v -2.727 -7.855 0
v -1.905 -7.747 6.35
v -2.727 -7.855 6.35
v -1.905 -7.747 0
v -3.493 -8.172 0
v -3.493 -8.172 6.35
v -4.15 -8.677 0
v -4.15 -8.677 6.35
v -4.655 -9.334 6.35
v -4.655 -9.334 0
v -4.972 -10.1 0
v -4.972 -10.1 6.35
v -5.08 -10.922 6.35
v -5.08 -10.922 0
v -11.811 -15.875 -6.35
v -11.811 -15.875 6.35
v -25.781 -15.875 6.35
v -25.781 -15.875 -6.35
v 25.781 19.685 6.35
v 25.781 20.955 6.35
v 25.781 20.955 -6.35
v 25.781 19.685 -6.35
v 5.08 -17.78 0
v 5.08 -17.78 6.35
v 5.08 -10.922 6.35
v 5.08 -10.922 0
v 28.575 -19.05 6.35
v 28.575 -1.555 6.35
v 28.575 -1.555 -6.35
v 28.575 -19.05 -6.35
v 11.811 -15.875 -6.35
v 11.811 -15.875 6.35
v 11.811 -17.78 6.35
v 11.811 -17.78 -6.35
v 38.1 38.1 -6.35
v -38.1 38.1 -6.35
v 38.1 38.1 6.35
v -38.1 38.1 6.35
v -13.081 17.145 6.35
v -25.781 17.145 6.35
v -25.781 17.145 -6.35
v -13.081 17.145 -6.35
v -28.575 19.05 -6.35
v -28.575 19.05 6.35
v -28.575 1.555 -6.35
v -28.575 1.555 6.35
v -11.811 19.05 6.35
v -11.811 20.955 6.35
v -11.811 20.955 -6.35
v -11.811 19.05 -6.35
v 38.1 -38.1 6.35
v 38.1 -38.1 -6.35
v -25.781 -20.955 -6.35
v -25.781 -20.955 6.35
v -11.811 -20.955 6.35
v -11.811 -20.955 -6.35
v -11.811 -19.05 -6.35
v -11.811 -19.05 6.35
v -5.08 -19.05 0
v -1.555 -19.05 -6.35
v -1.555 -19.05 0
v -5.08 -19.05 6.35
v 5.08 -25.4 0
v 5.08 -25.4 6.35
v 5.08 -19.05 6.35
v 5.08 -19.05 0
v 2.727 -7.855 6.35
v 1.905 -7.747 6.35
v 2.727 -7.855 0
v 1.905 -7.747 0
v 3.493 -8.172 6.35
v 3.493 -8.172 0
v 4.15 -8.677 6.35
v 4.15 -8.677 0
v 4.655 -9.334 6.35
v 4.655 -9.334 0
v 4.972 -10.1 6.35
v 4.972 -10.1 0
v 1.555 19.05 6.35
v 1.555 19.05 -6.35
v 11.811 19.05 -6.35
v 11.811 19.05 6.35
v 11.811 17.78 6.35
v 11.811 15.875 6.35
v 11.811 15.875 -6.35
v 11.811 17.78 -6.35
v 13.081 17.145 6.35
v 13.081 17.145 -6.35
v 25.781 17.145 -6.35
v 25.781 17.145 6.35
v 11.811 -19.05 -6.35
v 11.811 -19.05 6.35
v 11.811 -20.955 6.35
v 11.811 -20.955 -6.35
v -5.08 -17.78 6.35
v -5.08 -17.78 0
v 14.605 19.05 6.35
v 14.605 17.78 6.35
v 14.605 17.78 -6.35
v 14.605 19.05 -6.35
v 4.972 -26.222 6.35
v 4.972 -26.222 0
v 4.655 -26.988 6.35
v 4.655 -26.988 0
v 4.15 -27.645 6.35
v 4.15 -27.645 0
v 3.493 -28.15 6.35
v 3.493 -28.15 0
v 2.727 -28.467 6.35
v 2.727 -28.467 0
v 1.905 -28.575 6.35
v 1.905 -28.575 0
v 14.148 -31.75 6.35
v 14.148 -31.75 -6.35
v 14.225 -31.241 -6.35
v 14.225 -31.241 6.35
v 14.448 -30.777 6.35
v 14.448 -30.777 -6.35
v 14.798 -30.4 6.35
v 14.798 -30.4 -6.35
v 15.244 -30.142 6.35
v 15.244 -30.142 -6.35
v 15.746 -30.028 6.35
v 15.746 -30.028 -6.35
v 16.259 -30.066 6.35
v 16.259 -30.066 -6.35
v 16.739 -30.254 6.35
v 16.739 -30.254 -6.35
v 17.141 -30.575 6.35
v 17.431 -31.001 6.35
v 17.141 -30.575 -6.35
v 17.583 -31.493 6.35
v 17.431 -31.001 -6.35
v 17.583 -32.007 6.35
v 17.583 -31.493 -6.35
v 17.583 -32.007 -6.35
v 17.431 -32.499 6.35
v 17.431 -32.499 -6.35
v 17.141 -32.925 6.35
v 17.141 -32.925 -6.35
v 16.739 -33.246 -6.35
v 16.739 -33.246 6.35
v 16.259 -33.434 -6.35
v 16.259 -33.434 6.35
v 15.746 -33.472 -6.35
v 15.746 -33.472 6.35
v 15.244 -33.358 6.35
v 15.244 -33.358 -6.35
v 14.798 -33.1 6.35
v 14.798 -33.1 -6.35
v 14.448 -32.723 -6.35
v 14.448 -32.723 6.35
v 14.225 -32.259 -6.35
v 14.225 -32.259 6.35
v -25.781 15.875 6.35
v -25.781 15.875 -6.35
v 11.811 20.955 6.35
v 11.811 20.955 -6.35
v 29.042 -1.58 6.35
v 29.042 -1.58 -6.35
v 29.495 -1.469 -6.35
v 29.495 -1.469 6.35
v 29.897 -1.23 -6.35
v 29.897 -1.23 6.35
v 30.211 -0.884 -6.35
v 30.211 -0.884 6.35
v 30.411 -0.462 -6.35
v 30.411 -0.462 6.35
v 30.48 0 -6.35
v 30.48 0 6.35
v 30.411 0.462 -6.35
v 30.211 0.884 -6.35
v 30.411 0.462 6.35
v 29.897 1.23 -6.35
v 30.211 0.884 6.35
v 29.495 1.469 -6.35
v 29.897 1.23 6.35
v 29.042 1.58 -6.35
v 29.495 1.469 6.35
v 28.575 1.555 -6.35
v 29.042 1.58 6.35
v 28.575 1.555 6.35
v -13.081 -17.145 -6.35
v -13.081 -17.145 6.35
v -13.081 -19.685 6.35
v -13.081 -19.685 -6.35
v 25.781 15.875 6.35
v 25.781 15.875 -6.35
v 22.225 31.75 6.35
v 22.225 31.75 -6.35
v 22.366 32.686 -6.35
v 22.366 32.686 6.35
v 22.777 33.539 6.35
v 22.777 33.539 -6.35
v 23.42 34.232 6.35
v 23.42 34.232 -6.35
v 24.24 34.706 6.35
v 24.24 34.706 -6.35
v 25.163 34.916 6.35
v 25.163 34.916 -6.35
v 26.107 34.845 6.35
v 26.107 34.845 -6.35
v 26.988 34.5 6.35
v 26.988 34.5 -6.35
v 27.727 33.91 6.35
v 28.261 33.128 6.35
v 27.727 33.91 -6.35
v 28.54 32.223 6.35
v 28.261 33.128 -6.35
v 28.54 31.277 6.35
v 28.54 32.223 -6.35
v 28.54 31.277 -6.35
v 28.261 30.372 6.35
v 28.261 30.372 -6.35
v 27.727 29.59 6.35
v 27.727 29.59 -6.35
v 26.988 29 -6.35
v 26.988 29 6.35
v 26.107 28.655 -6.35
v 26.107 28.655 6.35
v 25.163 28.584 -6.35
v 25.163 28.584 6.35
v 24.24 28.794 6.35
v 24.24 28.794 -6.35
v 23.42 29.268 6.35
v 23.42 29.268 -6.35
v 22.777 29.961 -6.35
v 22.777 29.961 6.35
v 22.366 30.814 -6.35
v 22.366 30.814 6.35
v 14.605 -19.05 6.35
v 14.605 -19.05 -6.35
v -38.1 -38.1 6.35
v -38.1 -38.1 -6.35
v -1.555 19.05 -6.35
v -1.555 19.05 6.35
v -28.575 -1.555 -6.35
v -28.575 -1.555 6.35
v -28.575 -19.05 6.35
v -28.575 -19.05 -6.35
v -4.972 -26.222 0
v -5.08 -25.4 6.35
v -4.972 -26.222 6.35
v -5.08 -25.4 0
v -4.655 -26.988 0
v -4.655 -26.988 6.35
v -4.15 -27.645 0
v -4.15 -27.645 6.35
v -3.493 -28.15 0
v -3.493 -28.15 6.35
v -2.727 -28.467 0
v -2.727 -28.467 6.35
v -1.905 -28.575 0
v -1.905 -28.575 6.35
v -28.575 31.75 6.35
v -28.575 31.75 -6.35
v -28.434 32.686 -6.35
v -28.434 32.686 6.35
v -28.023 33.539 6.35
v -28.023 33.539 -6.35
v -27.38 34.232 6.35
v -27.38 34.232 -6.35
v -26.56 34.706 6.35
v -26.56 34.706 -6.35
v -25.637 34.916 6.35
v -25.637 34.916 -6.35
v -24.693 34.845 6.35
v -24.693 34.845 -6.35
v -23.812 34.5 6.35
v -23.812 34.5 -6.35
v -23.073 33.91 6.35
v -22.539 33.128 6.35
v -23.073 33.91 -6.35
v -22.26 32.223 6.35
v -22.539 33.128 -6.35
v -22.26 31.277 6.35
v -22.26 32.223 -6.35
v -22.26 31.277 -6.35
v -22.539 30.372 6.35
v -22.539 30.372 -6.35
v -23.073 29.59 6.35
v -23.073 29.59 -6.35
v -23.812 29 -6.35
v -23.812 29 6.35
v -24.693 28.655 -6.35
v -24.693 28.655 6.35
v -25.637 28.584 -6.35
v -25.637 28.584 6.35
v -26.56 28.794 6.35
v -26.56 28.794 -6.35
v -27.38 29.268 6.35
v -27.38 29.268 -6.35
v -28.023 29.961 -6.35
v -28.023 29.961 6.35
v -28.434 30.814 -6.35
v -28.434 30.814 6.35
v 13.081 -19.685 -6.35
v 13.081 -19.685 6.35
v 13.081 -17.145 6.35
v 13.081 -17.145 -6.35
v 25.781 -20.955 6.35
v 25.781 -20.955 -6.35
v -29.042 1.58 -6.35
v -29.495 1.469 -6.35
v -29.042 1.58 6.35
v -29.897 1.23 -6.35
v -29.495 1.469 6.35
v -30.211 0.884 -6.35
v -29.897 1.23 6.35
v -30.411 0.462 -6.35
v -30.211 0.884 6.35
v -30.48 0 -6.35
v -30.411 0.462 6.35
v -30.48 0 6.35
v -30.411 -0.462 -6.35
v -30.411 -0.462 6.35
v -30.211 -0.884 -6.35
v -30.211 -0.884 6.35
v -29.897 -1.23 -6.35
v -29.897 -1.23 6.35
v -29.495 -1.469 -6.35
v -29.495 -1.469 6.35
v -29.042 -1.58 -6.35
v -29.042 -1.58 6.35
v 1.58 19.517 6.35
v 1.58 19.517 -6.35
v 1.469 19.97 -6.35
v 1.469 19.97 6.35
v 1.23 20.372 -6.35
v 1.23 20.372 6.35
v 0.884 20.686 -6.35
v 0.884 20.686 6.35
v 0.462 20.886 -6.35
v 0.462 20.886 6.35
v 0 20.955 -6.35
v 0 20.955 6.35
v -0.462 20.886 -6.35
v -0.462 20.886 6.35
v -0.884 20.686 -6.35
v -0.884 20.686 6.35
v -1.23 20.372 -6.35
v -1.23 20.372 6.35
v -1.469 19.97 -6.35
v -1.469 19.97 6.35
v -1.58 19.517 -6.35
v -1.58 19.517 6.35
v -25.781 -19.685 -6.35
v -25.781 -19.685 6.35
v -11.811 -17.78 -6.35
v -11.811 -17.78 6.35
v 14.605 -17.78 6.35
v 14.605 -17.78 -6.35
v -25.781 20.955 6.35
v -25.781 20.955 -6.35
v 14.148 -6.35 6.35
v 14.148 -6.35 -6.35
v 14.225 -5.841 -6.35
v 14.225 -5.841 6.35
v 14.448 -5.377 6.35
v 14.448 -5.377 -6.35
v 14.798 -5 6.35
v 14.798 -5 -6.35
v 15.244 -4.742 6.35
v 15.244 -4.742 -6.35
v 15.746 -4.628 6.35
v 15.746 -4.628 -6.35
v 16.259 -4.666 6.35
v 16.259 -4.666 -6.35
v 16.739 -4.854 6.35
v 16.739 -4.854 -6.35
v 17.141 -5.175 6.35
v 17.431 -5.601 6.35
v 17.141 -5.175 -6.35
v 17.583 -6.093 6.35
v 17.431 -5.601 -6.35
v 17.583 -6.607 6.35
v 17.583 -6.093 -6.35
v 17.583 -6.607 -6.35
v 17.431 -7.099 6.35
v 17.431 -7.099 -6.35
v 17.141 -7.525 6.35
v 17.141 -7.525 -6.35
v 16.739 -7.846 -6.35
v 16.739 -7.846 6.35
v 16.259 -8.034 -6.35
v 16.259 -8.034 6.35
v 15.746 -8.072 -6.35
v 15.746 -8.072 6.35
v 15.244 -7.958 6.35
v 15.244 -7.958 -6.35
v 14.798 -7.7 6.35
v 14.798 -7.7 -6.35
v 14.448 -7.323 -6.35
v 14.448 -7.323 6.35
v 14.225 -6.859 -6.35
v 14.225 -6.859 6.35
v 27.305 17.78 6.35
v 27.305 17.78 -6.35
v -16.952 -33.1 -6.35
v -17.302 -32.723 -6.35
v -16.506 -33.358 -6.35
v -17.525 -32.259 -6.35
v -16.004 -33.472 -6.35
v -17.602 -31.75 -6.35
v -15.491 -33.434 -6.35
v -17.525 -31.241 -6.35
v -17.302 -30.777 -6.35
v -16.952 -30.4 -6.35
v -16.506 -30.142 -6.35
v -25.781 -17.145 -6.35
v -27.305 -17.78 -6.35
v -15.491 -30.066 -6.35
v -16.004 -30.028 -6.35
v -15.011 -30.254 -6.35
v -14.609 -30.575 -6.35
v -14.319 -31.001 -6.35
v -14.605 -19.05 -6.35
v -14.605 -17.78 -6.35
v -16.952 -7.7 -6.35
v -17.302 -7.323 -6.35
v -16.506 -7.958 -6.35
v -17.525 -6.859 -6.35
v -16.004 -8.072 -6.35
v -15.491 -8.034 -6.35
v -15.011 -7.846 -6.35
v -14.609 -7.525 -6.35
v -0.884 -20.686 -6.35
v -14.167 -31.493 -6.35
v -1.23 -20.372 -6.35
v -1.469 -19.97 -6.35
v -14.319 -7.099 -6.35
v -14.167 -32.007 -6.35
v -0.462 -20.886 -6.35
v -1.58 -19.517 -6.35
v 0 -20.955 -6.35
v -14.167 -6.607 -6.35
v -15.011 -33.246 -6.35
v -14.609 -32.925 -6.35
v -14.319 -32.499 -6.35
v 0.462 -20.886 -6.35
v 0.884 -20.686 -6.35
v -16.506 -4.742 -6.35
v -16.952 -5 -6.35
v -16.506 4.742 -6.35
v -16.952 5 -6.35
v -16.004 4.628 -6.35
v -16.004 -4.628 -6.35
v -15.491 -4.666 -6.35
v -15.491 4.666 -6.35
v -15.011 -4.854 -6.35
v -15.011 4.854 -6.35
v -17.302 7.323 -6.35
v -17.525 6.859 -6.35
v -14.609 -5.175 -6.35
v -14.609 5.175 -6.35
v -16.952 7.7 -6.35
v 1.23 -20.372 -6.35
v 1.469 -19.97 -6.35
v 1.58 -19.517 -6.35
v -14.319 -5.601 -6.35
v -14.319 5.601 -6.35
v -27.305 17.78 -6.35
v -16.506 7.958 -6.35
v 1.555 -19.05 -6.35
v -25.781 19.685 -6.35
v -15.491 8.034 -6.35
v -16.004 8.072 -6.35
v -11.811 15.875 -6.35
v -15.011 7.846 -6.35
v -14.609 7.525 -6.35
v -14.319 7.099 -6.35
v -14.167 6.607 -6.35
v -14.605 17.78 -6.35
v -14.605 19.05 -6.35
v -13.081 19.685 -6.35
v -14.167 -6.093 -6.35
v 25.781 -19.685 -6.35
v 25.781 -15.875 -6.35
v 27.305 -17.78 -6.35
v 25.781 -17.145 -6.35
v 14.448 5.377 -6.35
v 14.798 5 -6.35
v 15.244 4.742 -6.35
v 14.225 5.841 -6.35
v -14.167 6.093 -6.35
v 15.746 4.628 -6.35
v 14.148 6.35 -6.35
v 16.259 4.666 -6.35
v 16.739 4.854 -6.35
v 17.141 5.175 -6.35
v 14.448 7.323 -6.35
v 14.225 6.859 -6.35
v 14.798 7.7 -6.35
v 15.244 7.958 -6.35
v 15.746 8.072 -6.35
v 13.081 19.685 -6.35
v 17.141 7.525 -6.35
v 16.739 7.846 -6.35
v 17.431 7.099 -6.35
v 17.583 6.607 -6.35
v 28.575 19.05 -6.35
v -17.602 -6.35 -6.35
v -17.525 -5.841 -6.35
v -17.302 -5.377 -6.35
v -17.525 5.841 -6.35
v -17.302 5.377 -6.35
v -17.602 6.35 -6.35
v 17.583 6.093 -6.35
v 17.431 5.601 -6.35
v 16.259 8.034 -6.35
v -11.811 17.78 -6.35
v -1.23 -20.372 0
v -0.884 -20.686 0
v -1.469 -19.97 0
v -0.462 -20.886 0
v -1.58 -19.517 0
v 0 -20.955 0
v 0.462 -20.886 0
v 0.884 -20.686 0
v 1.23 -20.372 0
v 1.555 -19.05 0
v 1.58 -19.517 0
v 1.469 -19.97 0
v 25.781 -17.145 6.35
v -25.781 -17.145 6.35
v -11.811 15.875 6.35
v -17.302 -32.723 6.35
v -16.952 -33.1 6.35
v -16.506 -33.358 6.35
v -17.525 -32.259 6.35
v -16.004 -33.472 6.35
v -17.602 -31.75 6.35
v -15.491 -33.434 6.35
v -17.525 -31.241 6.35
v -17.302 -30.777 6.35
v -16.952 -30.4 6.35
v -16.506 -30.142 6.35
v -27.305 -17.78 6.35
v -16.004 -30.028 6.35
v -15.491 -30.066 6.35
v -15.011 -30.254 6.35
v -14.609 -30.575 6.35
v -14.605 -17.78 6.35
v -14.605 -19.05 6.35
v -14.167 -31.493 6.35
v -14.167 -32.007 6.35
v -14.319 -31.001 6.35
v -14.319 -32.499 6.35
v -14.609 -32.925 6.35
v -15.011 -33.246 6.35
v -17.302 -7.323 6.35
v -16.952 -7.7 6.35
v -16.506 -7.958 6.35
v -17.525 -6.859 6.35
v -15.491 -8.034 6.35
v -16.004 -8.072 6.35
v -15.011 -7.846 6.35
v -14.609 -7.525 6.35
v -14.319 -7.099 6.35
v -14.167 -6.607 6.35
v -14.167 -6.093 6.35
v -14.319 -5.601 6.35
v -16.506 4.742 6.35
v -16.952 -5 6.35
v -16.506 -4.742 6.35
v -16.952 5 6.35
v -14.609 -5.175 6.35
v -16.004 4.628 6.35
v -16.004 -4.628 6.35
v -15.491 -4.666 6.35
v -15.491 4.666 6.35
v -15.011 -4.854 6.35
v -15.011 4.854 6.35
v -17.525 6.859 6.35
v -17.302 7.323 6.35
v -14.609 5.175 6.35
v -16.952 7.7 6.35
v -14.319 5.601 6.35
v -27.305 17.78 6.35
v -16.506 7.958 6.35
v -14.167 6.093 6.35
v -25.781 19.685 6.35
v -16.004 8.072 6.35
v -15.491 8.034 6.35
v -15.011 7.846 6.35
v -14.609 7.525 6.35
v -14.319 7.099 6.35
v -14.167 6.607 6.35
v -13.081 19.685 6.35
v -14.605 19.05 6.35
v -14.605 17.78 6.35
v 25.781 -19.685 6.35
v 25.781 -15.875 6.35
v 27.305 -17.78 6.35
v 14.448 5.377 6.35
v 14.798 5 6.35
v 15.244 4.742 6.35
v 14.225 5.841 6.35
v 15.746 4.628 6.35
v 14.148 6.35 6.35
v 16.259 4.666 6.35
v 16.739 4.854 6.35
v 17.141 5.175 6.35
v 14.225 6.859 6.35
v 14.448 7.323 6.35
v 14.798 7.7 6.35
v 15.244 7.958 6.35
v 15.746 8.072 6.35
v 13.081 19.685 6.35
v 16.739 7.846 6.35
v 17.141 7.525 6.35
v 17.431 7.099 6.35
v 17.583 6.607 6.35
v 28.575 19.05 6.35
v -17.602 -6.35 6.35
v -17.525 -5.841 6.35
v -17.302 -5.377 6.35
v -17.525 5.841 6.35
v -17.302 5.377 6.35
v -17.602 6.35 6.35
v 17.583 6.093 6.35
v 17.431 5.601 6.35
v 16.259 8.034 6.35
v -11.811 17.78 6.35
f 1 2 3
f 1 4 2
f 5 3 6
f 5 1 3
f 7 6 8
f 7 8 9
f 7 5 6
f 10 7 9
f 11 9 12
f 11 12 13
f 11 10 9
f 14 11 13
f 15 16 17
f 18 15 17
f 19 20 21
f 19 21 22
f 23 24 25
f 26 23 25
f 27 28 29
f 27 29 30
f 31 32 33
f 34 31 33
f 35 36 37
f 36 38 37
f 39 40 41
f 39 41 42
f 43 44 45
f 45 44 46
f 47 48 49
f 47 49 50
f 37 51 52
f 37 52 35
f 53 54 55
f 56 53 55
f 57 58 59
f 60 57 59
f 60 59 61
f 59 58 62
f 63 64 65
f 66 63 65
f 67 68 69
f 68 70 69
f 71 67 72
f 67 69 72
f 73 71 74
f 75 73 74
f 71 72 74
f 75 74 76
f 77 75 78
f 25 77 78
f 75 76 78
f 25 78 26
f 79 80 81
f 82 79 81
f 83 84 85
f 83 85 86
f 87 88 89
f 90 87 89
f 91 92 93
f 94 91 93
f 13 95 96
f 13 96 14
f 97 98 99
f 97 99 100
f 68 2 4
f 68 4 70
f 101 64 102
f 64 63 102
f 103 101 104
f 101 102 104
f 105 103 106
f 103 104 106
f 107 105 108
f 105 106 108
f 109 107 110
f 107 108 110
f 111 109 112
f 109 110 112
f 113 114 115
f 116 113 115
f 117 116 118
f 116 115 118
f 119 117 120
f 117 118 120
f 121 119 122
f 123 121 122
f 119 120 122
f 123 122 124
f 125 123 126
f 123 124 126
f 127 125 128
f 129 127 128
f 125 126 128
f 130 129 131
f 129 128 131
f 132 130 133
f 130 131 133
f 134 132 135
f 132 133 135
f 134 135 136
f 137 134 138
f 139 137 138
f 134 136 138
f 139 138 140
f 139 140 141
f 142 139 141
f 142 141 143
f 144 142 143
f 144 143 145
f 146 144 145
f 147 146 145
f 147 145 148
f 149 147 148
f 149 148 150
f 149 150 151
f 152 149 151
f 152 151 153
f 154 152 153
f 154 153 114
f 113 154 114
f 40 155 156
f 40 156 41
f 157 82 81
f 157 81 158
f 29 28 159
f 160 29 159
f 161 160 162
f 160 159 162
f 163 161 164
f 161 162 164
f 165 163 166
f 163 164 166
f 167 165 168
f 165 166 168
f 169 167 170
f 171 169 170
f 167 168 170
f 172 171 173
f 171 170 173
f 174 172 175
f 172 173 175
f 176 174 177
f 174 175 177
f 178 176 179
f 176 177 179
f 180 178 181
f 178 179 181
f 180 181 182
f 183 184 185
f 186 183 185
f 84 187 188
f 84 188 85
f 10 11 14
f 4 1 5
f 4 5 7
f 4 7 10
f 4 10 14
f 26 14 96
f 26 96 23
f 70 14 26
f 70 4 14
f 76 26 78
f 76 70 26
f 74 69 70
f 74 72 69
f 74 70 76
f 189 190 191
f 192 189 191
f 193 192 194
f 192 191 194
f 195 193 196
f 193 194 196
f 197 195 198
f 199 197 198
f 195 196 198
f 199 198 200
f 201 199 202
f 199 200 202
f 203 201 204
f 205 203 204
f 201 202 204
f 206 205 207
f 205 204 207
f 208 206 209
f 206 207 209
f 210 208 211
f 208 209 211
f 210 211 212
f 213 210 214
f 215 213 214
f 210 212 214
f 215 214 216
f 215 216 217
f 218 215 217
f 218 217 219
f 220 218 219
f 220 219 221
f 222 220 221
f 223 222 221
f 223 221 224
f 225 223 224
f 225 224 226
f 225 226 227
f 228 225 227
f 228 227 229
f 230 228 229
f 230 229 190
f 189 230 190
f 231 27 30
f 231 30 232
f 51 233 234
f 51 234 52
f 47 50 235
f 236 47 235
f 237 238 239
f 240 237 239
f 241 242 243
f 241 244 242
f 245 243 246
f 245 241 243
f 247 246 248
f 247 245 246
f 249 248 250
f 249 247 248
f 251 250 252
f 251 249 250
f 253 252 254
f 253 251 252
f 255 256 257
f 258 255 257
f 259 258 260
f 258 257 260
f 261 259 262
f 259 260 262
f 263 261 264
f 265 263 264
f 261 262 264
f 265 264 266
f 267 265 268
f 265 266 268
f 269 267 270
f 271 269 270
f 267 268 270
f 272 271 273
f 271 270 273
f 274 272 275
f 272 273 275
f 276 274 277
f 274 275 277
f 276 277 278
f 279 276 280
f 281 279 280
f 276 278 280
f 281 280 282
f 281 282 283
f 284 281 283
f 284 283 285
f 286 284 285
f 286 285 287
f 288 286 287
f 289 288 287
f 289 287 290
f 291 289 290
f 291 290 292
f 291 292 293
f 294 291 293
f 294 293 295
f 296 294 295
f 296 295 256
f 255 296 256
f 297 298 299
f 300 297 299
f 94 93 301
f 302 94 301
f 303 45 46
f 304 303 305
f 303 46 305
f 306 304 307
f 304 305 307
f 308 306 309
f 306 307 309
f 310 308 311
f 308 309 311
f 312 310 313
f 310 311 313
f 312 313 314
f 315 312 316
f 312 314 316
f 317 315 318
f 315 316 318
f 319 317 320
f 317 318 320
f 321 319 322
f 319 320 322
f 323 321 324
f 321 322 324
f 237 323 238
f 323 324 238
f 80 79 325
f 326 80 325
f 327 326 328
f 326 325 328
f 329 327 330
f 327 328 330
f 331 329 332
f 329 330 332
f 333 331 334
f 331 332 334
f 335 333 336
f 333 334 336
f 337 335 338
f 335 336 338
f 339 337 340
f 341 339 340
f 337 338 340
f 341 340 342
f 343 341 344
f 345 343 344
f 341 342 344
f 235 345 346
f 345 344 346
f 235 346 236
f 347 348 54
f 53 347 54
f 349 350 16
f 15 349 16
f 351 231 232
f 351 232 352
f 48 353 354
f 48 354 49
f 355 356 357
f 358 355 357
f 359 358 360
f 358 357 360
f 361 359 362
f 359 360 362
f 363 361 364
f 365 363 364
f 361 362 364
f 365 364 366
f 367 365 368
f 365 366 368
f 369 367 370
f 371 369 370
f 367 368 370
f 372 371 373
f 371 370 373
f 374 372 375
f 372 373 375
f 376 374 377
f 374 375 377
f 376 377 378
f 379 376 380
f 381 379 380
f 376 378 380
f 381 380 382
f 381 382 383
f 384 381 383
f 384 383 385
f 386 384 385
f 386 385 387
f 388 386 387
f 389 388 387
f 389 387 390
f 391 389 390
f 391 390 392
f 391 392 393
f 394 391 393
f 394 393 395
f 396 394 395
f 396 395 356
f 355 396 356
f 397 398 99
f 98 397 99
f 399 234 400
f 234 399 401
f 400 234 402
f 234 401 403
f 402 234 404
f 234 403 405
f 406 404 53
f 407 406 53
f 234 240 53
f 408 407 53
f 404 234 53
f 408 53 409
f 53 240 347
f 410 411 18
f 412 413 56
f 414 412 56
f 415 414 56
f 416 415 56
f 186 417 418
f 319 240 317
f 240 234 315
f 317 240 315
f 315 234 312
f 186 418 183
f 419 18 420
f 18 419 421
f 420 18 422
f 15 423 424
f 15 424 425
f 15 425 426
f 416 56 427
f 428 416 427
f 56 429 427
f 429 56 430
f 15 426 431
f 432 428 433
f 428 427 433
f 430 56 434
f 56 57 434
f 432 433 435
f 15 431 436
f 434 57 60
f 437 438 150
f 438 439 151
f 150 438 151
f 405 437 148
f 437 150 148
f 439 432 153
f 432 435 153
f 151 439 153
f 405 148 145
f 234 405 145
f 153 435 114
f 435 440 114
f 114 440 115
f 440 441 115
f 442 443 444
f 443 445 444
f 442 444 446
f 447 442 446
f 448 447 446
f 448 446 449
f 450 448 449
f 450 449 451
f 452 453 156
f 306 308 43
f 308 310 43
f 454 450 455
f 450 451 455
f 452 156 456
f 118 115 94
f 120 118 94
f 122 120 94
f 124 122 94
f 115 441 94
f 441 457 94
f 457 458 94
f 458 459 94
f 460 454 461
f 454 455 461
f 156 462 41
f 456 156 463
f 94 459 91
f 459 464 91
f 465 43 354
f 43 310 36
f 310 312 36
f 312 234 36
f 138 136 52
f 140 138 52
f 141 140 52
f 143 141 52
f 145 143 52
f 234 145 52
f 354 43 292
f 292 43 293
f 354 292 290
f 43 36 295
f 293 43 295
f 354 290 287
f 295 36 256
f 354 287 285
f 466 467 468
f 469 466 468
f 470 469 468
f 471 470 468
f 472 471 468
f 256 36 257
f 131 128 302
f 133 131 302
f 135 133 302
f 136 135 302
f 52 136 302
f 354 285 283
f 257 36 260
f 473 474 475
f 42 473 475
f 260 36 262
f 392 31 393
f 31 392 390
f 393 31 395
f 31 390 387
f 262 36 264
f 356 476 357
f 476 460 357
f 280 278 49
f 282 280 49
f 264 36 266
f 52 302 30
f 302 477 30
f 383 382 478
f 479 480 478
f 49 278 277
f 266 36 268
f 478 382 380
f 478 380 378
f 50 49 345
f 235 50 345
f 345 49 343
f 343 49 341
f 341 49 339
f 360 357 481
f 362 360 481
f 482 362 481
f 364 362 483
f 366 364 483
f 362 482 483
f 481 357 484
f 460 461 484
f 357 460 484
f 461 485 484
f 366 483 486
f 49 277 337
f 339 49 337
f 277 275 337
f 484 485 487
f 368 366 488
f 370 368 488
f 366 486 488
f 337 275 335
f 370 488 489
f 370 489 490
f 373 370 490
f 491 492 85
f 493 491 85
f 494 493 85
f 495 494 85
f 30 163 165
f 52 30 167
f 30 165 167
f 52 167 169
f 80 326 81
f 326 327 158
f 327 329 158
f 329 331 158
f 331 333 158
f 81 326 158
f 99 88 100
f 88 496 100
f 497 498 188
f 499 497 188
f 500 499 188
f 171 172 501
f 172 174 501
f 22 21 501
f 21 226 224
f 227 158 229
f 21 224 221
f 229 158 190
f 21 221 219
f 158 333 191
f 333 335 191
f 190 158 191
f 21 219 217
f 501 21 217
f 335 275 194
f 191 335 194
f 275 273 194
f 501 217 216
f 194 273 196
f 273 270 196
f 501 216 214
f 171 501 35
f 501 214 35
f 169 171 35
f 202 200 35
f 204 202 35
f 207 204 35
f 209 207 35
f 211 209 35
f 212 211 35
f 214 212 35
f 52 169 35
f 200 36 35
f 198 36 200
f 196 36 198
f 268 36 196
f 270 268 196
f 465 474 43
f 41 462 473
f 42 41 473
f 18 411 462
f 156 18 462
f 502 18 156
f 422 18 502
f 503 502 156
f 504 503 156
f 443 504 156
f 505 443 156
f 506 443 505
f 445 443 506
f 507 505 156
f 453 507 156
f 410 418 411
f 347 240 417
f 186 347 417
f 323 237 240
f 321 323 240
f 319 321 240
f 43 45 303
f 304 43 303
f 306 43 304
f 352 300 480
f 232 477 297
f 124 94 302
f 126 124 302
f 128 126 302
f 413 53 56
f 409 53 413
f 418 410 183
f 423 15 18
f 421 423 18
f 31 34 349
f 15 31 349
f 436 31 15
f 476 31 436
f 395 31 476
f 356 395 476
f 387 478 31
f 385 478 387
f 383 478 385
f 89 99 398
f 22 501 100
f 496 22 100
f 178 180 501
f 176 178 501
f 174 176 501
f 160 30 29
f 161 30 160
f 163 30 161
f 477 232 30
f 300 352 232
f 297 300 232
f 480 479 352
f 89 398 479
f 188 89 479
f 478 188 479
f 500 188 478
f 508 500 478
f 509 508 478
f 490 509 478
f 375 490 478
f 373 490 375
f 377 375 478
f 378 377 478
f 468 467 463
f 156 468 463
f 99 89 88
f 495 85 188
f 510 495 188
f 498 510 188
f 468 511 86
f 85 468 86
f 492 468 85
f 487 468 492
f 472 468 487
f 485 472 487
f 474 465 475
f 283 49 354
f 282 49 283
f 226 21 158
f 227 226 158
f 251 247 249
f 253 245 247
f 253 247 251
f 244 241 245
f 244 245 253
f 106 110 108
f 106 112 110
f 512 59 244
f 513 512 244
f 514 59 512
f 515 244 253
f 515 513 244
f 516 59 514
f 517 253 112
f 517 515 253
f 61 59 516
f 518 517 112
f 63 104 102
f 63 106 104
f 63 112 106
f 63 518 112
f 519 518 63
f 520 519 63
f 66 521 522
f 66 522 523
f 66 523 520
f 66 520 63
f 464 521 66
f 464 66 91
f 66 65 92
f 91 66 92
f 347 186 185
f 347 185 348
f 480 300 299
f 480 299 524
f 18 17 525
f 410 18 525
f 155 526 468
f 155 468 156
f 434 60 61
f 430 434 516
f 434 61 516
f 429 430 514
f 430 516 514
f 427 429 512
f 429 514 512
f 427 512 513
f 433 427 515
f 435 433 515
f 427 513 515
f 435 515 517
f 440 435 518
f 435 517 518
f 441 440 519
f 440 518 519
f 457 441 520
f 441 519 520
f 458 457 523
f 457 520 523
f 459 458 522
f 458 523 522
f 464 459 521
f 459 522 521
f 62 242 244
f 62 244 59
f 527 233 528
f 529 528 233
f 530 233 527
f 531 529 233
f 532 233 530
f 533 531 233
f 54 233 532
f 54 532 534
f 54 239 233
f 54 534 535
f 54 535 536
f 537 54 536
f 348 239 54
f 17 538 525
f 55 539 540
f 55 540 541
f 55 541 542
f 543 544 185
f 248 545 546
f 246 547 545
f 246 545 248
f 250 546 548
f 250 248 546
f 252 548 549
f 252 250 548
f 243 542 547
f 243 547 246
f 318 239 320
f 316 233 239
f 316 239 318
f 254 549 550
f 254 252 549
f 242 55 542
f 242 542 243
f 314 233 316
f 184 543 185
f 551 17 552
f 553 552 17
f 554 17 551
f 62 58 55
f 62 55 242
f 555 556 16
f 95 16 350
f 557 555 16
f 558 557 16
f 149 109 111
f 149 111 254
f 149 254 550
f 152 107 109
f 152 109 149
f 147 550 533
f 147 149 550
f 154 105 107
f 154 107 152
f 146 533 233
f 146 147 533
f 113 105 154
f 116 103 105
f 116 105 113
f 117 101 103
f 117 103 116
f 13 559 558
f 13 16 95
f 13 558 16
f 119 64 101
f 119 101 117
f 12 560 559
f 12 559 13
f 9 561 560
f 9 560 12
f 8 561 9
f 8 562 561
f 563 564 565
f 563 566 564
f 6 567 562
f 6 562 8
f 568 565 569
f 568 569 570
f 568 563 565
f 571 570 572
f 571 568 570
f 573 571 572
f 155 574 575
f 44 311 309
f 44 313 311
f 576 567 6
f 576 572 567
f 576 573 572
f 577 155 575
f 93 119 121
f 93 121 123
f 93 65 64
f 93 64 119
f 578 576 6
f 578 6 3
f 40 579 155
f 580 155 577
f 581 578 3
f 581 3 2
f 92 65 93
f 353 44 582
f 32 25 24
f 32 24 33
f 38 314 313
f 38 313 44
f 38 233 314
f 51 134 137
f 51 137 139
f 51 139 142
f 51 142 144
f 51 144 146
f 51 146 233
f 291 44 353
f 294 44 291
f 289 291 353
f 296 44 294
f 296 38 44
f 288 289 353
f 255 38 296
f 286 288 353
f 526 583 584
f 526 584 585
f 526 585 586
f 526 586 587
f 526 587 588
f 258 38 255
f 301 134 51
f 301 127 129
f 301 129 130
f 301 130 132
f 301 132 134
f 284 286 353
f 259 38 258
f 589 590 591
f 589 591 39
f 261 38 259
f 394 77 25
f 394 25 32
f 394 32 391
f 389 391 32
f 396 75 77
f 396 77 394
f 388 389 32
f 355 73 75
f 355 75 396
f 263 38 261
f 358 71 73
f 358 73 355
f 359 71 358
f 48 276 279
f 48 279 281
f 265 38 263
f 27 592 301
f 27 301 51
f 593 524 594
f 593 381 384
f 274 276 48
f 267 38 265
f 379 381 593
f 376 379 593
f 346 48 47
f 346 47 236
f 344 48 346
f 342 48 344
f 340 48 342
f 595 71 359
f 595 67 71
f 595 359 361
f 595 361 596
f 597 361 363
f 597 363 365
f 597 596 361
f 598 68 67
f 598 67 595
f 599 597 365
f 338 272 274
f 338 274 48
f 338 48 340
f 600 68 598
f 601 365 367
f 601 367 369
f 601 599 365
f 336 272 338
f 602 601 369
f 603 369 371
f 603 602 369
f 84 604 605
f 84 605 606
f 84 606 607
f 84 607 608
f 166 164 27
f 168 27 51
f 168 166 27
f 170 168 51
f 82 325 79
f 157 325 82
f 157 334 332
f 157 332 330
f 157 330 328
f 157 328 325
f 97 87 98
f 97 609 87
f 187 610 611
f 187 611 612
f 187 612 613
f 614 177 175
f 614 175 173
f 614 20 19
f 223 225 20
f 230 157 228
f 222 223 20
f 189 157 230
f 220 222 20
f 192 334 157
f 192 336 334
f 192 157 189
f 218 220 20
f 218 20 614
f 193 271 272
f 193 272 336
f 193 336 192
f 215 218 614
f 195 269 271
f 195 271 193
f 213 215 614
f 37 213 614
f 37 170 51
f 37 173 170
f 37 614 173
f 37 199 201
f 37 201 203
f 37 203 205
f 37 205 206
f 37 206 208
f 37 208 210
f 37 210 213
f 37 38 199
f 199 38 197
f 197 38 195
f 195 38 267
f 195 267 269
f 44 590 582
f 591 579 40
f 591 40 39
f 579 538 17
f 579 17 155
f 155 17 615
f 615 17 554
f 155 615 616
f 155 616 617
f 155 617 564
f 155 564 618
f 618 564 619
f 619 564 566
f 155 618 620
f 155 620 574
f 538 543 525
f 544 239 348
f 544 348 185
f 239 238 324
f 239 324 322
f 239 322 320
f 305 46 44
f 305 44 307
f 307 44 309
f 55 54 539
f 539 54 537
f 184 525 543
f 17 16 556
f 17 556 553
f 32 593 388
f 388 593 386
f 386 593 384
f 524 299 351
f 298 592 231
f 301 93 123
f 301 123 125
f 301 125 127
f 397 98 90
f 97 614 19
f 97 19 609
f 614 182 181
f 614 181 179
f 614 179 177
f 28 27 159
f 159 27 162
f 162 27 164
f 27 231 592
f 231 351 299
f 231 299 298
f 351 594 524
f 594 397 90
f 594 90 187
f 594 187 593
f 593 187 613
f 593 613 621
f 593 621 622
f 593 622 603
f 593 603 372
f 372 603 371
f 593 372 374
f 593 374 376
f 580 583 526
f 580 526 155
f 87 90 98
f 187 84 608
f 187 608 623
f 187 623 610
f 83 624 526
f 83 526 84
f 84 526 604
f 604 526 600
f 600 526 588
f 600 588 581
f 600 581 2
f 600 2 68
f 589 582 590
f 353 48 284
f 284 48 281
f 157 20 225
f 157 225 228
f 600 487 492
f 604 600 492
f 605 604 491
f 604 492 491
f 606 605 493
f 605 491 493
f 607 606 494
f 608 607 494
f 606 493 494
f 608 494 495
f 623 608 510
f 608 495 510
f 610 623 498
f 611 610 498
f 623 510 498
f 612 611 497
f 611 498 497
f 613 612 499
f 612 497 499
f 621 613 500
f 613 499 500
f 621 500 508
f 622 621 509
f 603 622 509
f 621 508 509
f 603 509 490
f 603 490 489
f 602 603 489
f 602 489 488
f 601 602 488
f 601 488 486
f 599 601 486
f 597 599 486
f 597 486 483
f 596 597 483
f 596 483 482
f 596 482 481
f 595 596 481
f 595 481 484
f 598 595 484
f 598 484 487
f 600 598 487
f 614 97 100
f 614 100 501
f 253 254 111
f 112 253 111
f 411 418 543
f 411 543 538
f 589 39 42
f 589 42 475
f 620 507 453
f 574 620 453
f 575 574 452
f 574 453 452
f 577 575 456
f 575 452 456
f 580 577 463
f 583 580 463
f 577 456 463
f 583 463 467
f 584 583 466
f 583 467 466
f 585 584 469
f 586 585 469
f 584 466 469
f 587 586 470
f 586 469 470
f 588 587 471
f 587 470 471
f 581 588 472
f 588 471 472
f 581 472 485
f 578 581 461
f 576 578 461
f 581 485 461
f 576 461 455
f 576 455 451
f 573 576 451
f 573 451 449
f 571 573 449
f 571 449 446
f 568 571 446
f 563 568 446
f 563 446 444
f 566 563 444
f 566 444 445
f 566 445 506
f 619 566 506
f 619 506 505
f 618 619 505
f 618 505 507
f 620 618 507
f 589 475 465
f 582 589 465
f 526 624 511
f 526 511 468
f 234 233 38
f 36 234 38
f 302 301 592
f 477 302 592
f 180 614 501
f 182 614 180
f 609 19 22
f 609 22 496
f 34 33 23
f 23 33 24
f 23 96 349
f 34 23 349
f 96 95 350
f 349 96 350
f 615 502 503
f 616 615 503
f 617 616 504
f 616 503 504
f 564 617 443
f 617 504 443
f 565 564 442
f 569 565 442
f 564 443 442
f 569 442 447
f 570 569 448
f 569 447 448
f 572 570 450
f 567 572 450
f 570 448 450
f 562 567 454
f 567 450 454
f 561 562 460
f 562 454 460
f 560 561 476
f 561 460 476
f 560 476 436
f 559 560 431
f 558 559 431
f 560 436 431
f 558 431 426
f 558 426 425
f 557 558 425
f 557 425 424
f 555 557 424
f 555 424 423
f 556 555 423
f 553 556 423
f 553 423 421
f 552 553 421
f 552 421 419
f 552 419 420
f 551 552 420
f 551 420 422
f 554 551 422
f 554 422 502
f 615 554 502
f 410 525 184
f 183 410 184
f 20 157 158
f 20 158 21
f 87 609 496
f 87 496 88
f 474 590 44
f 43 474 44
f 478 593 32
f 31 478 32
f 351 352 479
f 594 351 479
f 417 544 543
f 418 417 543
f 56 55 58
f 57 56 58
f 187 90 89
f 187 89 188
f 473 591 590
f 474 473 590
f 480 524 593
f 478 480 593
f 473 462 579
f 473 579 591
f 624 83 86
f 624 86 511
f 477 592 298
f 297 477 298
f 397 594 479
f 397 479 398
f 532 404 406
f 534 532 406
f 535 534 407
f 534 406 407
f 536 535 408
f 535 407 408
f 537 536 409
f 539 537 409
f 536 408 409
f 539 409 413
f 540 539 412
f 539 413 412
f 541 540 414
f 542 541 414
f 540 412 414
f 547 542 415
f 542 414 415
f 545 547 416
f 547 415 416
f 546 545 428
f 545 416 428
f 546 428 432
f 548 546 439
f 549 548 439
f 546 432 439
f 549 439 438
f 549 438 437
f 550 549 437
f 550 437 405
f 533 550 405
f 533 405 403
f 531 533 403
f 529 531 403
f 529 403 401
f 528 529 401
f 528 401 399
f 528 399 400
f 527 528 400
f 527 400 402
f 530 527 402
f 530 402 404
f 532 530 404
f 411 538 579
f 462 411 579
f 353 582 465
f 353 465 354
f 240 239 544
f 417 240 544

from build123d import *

# Parameters (mm, degrees)
SKETCH1_W                       = 76.2
SKETCH1_H                       = 76.2
BOSS_EXTRUDE1_DEPTH             = 6.35
CUT_EXTRUDE1_DEPTH              = 12.7
CUT_EXTRUDE2_DEPTH              = 12.7
F_1_4_0_25_DIAMETER_HOLE1_D     = 6.35
F_1_4_0_25_DIAMETER_HOLE1_DEPTH = 12.7
F_8_32_TAPPED_HOLE1_D           = 3.4544
F_8_32_TAPPED_HOLE1_DEPTH       = 12.7
SKETCH8_W                       = 10.16
SKETCH8_H                       = 20.828
CUT_EXTRUDE3_DEPTH              = 6.35
FILLET1_R                       = 3.175
FILLET2_R                       = 3.175
FILLET3_R                       = 3.175
FILLET4_R                       = 3.175
CUT_EXTRUDE6_REACH              = 14.7
SKETCH11_R                      = 1.5875


with BuildPart() as part:
    # Sketch1 → Boss-Extrude1 (new body, symmetric)
    with BuildSketch(Plane.XY):
        Rectangle(SKETCH1_W, SKETCH1_H)
    extrude(amount=BOSS_EXTRUDE1_DEPTH, both=True)

    # Sketch2 → Cut-Extrude1 (cut)
    with BuildSketch(Plane.XY.offset(6.35)):
        Polygon((14.605, 19.05), (28.575, 19.05), (28.575, -19.05), (14.605, -19.05), (14.605, -17.78), (27.305, -17.78), (27.305, 17.78), (14.605, 17.78), align=None)
    cut_extrude1 = extrude(amount=-CUT_EXTRUDE1_DEPTH, mode=Mode.SUBTRACT)

    # Mirror1: Cut-Extrude1 across plane
    add(cut_extrude1.mirror(Plane(origin=(0, 0, 0), x_dir=(0, 0, 1), z_dir=(1, 0, 0))), mode=Mode.SUBTRACT)

    # Sketch3 → Cut-Extrude2 (cut)
    with BuildSketch(Plane.XY.offset(6.35)):
        Polygon((25.781, 17.145), (25.781, 15.875), (11.811, 15.875), (11.811, 17.78), (-11.811, 17.78), (-11.811, 15.875), (-25.781, 15.875), (-25.781, 17.145), (-13.081, 17.145), (-13.081, 19.685), (-25.781, 19.685), (-25.781, 20.955), (-11.811, 20.955), (-11.811, 19.05), (11.811, 19.05), (11.811, 20.955), (25.781, 20.955), (25.781, 19.685), (13.081, 19.685), (13.081, 17.145), align=None)
    cut_extrude2 = extrude(amount=-CUT_EXTRUDE2_DEPTH, mode=Mode.SUBTRACT)

    # Mirror2: Cut-Extrude2 across plane
    add(cut_extrude2.mirror(Plane.ZX), mode=Mode.SUBTRACT)

    # 1/4 (0.25) Diameter Hole1
    with Locations(Plane.XY.offset(6.35)):
        with Locations((-25.4, 31.75), (25.4, 31.75)):
            Hole(F_1_4_0_25_DIAMETER_HOLE1_D / 2, depth=F_1_4_0_25_DIAMETER_HOLE1_DEPTH)

    # #8-32 Tapped Hole1
    with Locations(Plane.XY.offset(6.35)):
        with Locations((-15.875, 6.35), (15.875, 6.35), (15.875, -6.35), (-15.875, -6.35), (-15.875, -31.75), (15.875, -31.75)):
            Hole(F_8_32_TAPPED_HOLE1_D / 2, depth=F_8_32_TAPPED_HOLE1_DEPTH)

    # Sketch8 → Cut-Extrude3 (cut)
    with BuildSketch(Plane.XY.offset(6.35)):
        with Locations((0, -18.161)):
            Rectangle(SKETCH8_W, SKETCH8_H)
    extrude(amount=-CUT_EXTRUDE3_DEPTH, mode=Mode.SUBTRACT)

    # Fillet1
    fillet1_edges = [part.edges().sort_by_distance(p)[0] for p in [
        (-5.08, -7.747, 3.175),
    ]]
    fillet(fillet1_edges, radius=FILLET1_R)

    # Fillet2
    fillet2_edges = [part.edges().sort_by_distance(p)[0] for p in [
        (-5.08, -28.575, 3.175),
    ]]
    fillet(fillet2_edges, radius=FILLET2_R)

    # Fillet3
    fillet3_edges = [part.edges().sort_by_distance(p)[0] for p in [
        (5.08, -7.747, 3.175),
    ]]
    fillet(fillet3_edges, radius=FILLET3_R)

    # Fillet4
    fillet4_edges = [part.edges().sort_by_distance(p)[0] for p in [
        (5.08, -28.575, 3.175),
    ]]
    fillet(fillet4_edges, radius=FILLET4_R)

    # Sketch11 → Cut-Extrude6 (cut, up to next)
    with BuildSketch(Plane.XY.offset(6.35), mode=Mode.PRIVATE) as cut_extrude6_sk1:
        with Locations((0, 19.3675)):
            Circle(SKETCH11_R)
    cut_extrude6_tool1 = extrude(cut_extrude6_sk1.sketch, amount=-CUT_EXTRUDE6_REACH, mode=Mode.PRIVATE) & part.part
    add(cut_extrude6_tool1.solids().sort_by_distance((0, 19.3675, 6.35))[0], mode=Mode.SUBTRACT)
    # Sketch11 → Cut-Extrude6 (cut, up to next)
    with BuildSketch(Plane.XY.offset(6.35), mode=Mode.PRIVATE) as cut_extrude6_sk2:
        with Locations((28.8925, 0)):
            Circle(SKETCH11_R)
    cut_extrude6_tool2 = extrude(cut_extrude6_sk2.sketch, amount=-CUT_EXTRUDE6_REACH, mode=Mode.PRIVATE) & part.part
    add(cut_extrude6_tool2.solids().sort_by_distance((28.8925, 0, 6.35))[0], mode=Mode.SUBTRACT)
    # Sketch11 → Cut-Extrude6 (cut, up to next)
    with BuildSketch(Plane.XY.offset(6.35), mode=Mode.PRIVATE) as cut_extrude6_sk3:
        with Locations((0, -19.3675)):
            Circle(SKETCH11_R)
    cut_extrude6_tool3 = extrude(cut_extrude6_sk3.sketch, amount=-CUT_EXTRUDE6_REACH, mode=Mode.PRIVATE) & part.part
    add(cut_extrude6_tool3.solids().sort_by_distance((0, -19.3675, 6.35))[0], mode=Mode.SUBTRACT)
    # Sketch11 → Cut-Extrude6 (cut, up to next)
    with BuildSketch(Plane.XY.offset(6.35), mode=Mode.PRIVATE) as cut_extrude6_sk4:
        with Locations((-28.8925, 0)):
            Circle(SKETCH11_R)
    cut_extrude6_tool4 = extrude(cut_extrude6_sk4.sketch, amount=-CUT_EXTRUDE6_REACH, mode=Mode.PRIVATE) & part.part
    add(cut_extrude6_tool4.solids().sort_by_distance((-28.8925, 0, 6.35))[0], mode=Mode.SUBTRACT)


solid = part.part
